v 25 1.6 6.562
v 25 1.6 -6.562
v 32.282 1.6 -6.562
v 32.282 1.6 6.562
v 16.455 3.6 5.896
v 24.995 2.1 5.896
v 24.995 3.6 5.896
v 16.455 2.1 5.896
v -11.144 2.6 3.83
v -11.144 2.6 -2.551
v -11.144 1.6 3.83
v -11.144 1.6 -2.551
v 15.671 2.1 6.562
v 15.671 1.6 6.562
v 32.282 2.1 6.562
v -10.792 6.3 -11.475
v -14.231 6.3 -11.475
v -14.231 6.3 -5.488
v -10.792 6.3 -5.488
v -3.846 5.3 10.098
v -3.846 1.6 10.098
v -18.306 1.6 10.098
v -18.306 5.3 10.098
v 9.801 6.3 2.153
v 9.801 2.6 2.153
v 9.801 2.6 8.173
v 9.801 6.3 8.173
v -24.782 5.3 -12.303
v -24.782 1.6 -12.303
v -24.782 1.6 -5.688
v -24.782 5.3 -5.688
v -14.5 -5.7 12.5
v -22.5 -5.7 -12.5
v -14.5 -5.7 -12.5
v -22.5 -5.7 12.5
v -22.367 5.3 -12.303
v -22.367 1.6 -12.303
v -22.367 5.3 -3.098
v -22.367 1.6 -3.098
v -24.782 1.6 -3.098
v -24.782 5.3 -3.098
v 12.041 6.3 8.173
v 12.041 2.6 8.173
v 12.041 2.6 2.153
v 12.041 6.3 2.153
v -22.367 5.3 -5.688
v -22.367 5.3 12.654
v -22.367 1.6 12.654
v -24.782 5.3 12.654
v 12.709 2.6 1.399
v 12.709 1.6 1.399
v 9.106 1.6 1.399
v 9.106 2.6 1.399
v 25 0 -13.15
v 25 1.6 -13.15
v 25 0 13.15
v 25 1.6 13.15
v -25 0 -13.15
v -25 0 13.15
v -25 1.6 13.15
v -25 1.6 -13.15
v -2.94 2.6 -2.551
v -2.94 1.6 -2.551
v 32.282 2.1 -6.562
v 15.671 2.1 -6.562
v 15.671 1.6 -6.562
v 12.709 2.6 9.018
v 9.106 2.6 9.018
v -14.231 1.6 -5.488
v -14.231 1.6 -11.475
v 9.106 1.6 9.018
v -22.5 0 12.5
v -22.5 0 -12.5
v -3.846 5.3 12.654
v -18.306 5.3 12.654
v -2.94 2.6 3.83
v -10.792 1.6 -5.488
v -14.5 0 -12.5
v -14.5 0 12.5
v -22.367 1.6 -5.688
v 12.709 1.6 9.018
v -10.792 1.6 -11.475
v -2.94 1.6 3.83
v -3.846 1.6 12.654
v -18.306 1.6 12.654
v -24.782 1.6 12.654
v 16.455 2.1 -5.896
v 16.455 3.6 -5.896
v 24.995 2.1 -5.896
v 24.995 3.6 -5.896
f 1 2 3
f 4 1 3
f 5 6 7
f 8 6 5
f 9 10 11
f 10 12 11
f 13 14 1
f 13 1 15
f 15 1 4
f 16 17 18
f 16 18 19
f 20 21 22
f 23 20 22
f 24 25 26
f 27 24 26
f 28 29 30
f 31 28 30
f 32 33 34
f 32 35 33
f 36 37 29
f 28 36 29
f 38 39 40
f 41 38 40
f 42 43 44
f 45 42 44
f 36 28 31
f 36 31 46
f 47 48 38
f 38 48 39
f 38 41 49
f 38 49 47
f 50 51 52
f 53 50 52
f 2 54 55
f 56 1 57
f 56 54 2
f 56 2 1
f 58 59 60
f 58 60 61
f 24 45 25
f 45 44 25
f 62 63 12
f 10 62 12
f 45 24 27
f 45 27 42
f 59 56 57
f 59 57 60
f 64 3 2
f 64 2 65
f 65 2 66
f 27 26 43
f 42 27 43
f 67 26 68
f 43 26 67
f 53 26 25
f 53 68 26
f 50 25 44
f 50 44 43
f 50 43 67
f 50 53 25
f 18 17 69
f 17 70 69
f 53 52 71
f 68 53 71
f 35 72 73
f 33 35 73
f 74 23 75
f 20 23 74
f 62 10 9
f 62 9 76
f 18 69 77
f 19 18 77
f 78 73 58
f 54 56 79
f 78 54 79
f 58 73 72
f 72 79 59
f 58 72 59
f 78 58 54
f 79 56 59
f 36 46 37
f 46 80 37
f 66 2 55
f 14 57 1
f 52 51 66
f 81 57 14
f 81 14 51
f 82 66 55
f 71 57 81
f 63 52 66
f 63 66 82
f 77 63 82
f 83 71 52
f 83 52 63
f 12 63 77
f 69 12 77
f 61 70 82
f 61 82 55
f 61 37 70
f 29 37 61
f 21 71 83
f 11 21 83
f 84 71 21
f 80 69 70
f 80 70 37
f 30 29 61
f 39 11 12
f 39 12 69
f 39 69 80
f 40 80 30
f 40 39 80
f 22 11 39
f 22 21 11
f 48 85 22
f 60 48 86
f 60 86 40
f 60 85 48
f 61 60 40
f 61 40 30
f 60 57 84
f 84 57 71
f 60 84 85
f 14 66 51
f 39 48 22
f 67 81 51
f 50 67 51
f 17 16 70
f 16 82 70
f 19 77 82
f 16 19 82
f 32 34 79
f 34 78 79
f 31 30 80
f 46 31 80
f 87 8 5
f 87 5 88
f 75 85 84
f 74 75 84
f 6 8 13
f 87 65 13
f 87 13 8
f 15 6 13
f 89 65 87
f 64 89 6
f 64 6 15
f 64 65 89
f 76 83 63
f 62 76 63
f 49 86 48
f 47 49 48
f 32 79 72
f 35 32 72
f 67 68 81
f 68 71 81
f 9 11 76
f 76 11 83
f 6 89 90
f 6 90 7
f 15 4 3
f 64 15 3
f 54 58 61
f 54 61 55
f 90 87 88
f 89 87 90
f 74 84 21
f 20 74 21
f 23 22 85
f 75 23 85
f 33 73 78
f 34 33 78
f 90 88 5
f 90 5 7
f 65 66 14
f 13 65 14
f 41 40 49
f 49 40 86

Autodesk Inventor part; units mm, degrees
ref_plane "YZ Plane" through (0, 0, 0) normal (1, 0, 0) x (0, 1, 0)
ref_plane "XZ Plane" through (0, 0, 0) normal (0, 1, 0) x (-1, 0, 0)
ref_plane "XY Plane" through (0, 0, 0) normal (0, 0, 1) x (1, 0, 0)
sketch "Boceto1" plane through (0, 0, 0) normal (0, 1, 0) x (-1, 0, 0)
  line L0 (-25, 13.15) -> (25, 13.15)
  line L1 (25, 13.15) -> (25, -13.15)
  line L2 (25, -13.15) -> (-25, -13.15)
  line L3 (-25, -13.15) -> (-25, 13.15)
  line L4 (-25, 13.15) -> (25, -13.15) construction
  line L5 (25, 13.15) -> (-25, -13.15) construction
  point P0 (0, 0)
  dimension "d0" = 50
  dimension "d1" = 26.3
extrude "Extrusión1" add sketch "Boceto1" along normal blind 1.6
sketch "Boceto2" plane through (0, 1.6, 0) normal (0, 1, 0) x (1, 0, 0)
  line L0 (15.6711, -6.5623) -> (32.2824, -6.5623)
  line L1 (32.2824, -6.5623) -> (32.2824, 6.5623)
  line L2 (32.2824, 6.5623) -> (15.6711, 6.5623)
  line L3 (15.6711, 6.5623) -> (15.6711, -6.5623)
  line L4 (15.6711, -6.5623) -> (32.2824, 6.5623) construction
  line L5 (32.2824, -6.5623) -> (15.6711, 6.5623) construction
  point P0 (0, 0)
  point P1 (23.9767, 0)
extrude "Extrusión2" add sketch "Boceto2" along normal blind 0.5
sketch "Boceto3" plane through (0, 2.1, 0) normal (0, 1, 0) x (1, 0, 0)
  line L0 (24.9953, -5.8962) -> (16.4546, -5.8962)
  line L1 (16.4546, -5.8962) -> (16.4546, 5.8962)
  line L2 (16.4546, 5.8962) -> (24.9953, 5.8962)
  line L3 (24.9953, 5.8962) -> (24.9953, -5.8962)
  line L4 (24.9953, -5.8962) -> (16.4546, 5.8962) construction
  line L5 (16.4546, -5.8962) -> (24.9953, 5.8962) construction
  point P0 (0, 0)
  point P1 (20.725, 0)
extrude "Extrusión3" add sketch "Boceto3" along normal blind 1.5
sketch "Boceto4" plane through (0, 1.6, 0) normal (0, 1, 0) x (1, 0, 0)
  line L0 (-24.7819, -12.6535) -> (-22.3667, -12.6535)
  line L1 (-22.3667, -12.6535) -> (-22.3667, 3.0977)
  line L2 (-22.3667, 3.0977) -> (-24.7819, 3.0977)
  line L3 (-24.7819, 3.0977) -> (-24.7819, -12.6535)
  line L4 (-24.7819, 5.6879) -> (-22.3667, 5.6879)
  line L5 (-22.3667, 5.6879) -> (-22.3667, 12.3034)
  line L6 (-22.3667, 12.3034) -> (-24.7819, 12.3034)
  line L7 (-24.7819, 12.3034) -> (-24.7819, 5.6879)
  line L8 (-18.3064, -12.6535) -> (-7.2456, -12.6535)
  line L9 (-7.2456, -12.6535) -> (-7.2456, -10.0983)
  line L10 (-7.2456, -10.0983) -> (-18.3064, -10.0983)
  line L11 (-18.3064, -10.0983) -> (-18.3064, -12.6535)
  line L12 (-7.2456, -12.6535) -> (-3.8465, -12.6535)
  line L13 (-3.8465, -12.6535) -> (-3.8465, -10.0983)
  line L14 (-3.8465, -10.0983) -> (-7.2456, -10.0983)
  line L15 (-7.2456, -10.0983) -> (-7.2456, -12.6535)
  point P0 (0, 0)
extrude "Extrusión4" add sketch "Boceto4" along normal blind 3.7
sketch "Boceto5" plane through (0, 1.6, 0) normal (0, 1, 0) x (1, 0, 0)
  line L0 (9.1061, -9.0184) -> (12.7089, -9.0184)
  line L1 (12.7089, -9.0184) -> (12.7089, -1.3991)
  line L2 (12.7089, -1.3991) -> (9.1061, -1.3991)
  line L3 (9.1061, -1.3991) -> (9.1061, -9.0184)
  line L4 (-11.1445, -3.83) -> (-2.9401, -3.83)
  line L5 (-2.9401, -3.83) -> (-2.9401, 2.5512)
  line L6 (-2.9401, 2.5512) -> (-11.1445, 2.5512)
  line L7 (-11.1445, 2.5512) -> (-11.1445, -3.83)
  point P0 (0, 0)
extrude "Extrusión5" add sketch "Boceto5" along normal blind 1
sketch "Boceto6" plane through (0, 1.6, 0) normal (0, 1, 0) x (1, 0, 0)
  line L0 (-14.2306, 5.4877) -> (-10.7922, 5.4877)
  line L1 (-10.7922, 5.4877) -> (-10.7922, 11.4752)
  line L2 (-10.7922, 11.4752) -> (-14.2306, 11.4752)
  line L3 (-14.2306, 11.4752) -> (-14.2306, 5.4877)
  point P0 (0, 0)
extrude "Extrusión6" add sketch "Boceto6" along normal blind 4.7
sketch "Boceto7" plane through (0, 2.6, 0) normal (0, 1, 0) x (1, 0, 0)
  line L0 (9.8007, -8.1731) -> (12.0409, -8.1731)
  line L1 (12.0409, -8.1731) -> (12.0409, -2.1527)
  line L2 (12.0409, -2.1527) -> (9.8007, -2.1527)
  line L3 (9.8007, -2.1527) -> (9.8007, -8.1731)
  point P0 (0, 0)
extrude "Extrusión7" add sketch "Boceto7" along normal blind 3.7
sketch "Boceto8" plane through (0, 0, 0) normal (0, -1, 0) x (1, 0, 0)
  line L0 (-25, -13.15) -> (-25, 13.15) projected
  line L1 (-25, 0) -> (-22.5, 0)
  line L2 (-22.5, 0) -> (-22.5, -12.5)
  line L3 (-22.5, -12.5) -> (-14.5, -12.5)
  line L4 (-24.7819, -12.3034) -> (-22.3667, -12.3034) projected
  line L5 (-22.5, -12.5) -> (-14.5, -12.5) construction
  line L6 (-14.5, -12.5) -> (-14.5, 12.5)
  line L7 (-14.5, 12.5) -> (-22.5, 12.5)
  line L8 (-25, 13.15) -> (25, 13.15) projected
  line L9 (-22.5, 12.5) -> (-22.5, 0)
  point P0 (0, 0)
  dimension "d16" = 2.5
  dimension "d17" = 12.5
  dimension "d18" = 8
  dimension "d19" = 0
  dimension "d20" = 25
extrude "Extrusión8" add sketch "Boceto8" along normal blind 5.7
properties part number "Nordic_PCB"
